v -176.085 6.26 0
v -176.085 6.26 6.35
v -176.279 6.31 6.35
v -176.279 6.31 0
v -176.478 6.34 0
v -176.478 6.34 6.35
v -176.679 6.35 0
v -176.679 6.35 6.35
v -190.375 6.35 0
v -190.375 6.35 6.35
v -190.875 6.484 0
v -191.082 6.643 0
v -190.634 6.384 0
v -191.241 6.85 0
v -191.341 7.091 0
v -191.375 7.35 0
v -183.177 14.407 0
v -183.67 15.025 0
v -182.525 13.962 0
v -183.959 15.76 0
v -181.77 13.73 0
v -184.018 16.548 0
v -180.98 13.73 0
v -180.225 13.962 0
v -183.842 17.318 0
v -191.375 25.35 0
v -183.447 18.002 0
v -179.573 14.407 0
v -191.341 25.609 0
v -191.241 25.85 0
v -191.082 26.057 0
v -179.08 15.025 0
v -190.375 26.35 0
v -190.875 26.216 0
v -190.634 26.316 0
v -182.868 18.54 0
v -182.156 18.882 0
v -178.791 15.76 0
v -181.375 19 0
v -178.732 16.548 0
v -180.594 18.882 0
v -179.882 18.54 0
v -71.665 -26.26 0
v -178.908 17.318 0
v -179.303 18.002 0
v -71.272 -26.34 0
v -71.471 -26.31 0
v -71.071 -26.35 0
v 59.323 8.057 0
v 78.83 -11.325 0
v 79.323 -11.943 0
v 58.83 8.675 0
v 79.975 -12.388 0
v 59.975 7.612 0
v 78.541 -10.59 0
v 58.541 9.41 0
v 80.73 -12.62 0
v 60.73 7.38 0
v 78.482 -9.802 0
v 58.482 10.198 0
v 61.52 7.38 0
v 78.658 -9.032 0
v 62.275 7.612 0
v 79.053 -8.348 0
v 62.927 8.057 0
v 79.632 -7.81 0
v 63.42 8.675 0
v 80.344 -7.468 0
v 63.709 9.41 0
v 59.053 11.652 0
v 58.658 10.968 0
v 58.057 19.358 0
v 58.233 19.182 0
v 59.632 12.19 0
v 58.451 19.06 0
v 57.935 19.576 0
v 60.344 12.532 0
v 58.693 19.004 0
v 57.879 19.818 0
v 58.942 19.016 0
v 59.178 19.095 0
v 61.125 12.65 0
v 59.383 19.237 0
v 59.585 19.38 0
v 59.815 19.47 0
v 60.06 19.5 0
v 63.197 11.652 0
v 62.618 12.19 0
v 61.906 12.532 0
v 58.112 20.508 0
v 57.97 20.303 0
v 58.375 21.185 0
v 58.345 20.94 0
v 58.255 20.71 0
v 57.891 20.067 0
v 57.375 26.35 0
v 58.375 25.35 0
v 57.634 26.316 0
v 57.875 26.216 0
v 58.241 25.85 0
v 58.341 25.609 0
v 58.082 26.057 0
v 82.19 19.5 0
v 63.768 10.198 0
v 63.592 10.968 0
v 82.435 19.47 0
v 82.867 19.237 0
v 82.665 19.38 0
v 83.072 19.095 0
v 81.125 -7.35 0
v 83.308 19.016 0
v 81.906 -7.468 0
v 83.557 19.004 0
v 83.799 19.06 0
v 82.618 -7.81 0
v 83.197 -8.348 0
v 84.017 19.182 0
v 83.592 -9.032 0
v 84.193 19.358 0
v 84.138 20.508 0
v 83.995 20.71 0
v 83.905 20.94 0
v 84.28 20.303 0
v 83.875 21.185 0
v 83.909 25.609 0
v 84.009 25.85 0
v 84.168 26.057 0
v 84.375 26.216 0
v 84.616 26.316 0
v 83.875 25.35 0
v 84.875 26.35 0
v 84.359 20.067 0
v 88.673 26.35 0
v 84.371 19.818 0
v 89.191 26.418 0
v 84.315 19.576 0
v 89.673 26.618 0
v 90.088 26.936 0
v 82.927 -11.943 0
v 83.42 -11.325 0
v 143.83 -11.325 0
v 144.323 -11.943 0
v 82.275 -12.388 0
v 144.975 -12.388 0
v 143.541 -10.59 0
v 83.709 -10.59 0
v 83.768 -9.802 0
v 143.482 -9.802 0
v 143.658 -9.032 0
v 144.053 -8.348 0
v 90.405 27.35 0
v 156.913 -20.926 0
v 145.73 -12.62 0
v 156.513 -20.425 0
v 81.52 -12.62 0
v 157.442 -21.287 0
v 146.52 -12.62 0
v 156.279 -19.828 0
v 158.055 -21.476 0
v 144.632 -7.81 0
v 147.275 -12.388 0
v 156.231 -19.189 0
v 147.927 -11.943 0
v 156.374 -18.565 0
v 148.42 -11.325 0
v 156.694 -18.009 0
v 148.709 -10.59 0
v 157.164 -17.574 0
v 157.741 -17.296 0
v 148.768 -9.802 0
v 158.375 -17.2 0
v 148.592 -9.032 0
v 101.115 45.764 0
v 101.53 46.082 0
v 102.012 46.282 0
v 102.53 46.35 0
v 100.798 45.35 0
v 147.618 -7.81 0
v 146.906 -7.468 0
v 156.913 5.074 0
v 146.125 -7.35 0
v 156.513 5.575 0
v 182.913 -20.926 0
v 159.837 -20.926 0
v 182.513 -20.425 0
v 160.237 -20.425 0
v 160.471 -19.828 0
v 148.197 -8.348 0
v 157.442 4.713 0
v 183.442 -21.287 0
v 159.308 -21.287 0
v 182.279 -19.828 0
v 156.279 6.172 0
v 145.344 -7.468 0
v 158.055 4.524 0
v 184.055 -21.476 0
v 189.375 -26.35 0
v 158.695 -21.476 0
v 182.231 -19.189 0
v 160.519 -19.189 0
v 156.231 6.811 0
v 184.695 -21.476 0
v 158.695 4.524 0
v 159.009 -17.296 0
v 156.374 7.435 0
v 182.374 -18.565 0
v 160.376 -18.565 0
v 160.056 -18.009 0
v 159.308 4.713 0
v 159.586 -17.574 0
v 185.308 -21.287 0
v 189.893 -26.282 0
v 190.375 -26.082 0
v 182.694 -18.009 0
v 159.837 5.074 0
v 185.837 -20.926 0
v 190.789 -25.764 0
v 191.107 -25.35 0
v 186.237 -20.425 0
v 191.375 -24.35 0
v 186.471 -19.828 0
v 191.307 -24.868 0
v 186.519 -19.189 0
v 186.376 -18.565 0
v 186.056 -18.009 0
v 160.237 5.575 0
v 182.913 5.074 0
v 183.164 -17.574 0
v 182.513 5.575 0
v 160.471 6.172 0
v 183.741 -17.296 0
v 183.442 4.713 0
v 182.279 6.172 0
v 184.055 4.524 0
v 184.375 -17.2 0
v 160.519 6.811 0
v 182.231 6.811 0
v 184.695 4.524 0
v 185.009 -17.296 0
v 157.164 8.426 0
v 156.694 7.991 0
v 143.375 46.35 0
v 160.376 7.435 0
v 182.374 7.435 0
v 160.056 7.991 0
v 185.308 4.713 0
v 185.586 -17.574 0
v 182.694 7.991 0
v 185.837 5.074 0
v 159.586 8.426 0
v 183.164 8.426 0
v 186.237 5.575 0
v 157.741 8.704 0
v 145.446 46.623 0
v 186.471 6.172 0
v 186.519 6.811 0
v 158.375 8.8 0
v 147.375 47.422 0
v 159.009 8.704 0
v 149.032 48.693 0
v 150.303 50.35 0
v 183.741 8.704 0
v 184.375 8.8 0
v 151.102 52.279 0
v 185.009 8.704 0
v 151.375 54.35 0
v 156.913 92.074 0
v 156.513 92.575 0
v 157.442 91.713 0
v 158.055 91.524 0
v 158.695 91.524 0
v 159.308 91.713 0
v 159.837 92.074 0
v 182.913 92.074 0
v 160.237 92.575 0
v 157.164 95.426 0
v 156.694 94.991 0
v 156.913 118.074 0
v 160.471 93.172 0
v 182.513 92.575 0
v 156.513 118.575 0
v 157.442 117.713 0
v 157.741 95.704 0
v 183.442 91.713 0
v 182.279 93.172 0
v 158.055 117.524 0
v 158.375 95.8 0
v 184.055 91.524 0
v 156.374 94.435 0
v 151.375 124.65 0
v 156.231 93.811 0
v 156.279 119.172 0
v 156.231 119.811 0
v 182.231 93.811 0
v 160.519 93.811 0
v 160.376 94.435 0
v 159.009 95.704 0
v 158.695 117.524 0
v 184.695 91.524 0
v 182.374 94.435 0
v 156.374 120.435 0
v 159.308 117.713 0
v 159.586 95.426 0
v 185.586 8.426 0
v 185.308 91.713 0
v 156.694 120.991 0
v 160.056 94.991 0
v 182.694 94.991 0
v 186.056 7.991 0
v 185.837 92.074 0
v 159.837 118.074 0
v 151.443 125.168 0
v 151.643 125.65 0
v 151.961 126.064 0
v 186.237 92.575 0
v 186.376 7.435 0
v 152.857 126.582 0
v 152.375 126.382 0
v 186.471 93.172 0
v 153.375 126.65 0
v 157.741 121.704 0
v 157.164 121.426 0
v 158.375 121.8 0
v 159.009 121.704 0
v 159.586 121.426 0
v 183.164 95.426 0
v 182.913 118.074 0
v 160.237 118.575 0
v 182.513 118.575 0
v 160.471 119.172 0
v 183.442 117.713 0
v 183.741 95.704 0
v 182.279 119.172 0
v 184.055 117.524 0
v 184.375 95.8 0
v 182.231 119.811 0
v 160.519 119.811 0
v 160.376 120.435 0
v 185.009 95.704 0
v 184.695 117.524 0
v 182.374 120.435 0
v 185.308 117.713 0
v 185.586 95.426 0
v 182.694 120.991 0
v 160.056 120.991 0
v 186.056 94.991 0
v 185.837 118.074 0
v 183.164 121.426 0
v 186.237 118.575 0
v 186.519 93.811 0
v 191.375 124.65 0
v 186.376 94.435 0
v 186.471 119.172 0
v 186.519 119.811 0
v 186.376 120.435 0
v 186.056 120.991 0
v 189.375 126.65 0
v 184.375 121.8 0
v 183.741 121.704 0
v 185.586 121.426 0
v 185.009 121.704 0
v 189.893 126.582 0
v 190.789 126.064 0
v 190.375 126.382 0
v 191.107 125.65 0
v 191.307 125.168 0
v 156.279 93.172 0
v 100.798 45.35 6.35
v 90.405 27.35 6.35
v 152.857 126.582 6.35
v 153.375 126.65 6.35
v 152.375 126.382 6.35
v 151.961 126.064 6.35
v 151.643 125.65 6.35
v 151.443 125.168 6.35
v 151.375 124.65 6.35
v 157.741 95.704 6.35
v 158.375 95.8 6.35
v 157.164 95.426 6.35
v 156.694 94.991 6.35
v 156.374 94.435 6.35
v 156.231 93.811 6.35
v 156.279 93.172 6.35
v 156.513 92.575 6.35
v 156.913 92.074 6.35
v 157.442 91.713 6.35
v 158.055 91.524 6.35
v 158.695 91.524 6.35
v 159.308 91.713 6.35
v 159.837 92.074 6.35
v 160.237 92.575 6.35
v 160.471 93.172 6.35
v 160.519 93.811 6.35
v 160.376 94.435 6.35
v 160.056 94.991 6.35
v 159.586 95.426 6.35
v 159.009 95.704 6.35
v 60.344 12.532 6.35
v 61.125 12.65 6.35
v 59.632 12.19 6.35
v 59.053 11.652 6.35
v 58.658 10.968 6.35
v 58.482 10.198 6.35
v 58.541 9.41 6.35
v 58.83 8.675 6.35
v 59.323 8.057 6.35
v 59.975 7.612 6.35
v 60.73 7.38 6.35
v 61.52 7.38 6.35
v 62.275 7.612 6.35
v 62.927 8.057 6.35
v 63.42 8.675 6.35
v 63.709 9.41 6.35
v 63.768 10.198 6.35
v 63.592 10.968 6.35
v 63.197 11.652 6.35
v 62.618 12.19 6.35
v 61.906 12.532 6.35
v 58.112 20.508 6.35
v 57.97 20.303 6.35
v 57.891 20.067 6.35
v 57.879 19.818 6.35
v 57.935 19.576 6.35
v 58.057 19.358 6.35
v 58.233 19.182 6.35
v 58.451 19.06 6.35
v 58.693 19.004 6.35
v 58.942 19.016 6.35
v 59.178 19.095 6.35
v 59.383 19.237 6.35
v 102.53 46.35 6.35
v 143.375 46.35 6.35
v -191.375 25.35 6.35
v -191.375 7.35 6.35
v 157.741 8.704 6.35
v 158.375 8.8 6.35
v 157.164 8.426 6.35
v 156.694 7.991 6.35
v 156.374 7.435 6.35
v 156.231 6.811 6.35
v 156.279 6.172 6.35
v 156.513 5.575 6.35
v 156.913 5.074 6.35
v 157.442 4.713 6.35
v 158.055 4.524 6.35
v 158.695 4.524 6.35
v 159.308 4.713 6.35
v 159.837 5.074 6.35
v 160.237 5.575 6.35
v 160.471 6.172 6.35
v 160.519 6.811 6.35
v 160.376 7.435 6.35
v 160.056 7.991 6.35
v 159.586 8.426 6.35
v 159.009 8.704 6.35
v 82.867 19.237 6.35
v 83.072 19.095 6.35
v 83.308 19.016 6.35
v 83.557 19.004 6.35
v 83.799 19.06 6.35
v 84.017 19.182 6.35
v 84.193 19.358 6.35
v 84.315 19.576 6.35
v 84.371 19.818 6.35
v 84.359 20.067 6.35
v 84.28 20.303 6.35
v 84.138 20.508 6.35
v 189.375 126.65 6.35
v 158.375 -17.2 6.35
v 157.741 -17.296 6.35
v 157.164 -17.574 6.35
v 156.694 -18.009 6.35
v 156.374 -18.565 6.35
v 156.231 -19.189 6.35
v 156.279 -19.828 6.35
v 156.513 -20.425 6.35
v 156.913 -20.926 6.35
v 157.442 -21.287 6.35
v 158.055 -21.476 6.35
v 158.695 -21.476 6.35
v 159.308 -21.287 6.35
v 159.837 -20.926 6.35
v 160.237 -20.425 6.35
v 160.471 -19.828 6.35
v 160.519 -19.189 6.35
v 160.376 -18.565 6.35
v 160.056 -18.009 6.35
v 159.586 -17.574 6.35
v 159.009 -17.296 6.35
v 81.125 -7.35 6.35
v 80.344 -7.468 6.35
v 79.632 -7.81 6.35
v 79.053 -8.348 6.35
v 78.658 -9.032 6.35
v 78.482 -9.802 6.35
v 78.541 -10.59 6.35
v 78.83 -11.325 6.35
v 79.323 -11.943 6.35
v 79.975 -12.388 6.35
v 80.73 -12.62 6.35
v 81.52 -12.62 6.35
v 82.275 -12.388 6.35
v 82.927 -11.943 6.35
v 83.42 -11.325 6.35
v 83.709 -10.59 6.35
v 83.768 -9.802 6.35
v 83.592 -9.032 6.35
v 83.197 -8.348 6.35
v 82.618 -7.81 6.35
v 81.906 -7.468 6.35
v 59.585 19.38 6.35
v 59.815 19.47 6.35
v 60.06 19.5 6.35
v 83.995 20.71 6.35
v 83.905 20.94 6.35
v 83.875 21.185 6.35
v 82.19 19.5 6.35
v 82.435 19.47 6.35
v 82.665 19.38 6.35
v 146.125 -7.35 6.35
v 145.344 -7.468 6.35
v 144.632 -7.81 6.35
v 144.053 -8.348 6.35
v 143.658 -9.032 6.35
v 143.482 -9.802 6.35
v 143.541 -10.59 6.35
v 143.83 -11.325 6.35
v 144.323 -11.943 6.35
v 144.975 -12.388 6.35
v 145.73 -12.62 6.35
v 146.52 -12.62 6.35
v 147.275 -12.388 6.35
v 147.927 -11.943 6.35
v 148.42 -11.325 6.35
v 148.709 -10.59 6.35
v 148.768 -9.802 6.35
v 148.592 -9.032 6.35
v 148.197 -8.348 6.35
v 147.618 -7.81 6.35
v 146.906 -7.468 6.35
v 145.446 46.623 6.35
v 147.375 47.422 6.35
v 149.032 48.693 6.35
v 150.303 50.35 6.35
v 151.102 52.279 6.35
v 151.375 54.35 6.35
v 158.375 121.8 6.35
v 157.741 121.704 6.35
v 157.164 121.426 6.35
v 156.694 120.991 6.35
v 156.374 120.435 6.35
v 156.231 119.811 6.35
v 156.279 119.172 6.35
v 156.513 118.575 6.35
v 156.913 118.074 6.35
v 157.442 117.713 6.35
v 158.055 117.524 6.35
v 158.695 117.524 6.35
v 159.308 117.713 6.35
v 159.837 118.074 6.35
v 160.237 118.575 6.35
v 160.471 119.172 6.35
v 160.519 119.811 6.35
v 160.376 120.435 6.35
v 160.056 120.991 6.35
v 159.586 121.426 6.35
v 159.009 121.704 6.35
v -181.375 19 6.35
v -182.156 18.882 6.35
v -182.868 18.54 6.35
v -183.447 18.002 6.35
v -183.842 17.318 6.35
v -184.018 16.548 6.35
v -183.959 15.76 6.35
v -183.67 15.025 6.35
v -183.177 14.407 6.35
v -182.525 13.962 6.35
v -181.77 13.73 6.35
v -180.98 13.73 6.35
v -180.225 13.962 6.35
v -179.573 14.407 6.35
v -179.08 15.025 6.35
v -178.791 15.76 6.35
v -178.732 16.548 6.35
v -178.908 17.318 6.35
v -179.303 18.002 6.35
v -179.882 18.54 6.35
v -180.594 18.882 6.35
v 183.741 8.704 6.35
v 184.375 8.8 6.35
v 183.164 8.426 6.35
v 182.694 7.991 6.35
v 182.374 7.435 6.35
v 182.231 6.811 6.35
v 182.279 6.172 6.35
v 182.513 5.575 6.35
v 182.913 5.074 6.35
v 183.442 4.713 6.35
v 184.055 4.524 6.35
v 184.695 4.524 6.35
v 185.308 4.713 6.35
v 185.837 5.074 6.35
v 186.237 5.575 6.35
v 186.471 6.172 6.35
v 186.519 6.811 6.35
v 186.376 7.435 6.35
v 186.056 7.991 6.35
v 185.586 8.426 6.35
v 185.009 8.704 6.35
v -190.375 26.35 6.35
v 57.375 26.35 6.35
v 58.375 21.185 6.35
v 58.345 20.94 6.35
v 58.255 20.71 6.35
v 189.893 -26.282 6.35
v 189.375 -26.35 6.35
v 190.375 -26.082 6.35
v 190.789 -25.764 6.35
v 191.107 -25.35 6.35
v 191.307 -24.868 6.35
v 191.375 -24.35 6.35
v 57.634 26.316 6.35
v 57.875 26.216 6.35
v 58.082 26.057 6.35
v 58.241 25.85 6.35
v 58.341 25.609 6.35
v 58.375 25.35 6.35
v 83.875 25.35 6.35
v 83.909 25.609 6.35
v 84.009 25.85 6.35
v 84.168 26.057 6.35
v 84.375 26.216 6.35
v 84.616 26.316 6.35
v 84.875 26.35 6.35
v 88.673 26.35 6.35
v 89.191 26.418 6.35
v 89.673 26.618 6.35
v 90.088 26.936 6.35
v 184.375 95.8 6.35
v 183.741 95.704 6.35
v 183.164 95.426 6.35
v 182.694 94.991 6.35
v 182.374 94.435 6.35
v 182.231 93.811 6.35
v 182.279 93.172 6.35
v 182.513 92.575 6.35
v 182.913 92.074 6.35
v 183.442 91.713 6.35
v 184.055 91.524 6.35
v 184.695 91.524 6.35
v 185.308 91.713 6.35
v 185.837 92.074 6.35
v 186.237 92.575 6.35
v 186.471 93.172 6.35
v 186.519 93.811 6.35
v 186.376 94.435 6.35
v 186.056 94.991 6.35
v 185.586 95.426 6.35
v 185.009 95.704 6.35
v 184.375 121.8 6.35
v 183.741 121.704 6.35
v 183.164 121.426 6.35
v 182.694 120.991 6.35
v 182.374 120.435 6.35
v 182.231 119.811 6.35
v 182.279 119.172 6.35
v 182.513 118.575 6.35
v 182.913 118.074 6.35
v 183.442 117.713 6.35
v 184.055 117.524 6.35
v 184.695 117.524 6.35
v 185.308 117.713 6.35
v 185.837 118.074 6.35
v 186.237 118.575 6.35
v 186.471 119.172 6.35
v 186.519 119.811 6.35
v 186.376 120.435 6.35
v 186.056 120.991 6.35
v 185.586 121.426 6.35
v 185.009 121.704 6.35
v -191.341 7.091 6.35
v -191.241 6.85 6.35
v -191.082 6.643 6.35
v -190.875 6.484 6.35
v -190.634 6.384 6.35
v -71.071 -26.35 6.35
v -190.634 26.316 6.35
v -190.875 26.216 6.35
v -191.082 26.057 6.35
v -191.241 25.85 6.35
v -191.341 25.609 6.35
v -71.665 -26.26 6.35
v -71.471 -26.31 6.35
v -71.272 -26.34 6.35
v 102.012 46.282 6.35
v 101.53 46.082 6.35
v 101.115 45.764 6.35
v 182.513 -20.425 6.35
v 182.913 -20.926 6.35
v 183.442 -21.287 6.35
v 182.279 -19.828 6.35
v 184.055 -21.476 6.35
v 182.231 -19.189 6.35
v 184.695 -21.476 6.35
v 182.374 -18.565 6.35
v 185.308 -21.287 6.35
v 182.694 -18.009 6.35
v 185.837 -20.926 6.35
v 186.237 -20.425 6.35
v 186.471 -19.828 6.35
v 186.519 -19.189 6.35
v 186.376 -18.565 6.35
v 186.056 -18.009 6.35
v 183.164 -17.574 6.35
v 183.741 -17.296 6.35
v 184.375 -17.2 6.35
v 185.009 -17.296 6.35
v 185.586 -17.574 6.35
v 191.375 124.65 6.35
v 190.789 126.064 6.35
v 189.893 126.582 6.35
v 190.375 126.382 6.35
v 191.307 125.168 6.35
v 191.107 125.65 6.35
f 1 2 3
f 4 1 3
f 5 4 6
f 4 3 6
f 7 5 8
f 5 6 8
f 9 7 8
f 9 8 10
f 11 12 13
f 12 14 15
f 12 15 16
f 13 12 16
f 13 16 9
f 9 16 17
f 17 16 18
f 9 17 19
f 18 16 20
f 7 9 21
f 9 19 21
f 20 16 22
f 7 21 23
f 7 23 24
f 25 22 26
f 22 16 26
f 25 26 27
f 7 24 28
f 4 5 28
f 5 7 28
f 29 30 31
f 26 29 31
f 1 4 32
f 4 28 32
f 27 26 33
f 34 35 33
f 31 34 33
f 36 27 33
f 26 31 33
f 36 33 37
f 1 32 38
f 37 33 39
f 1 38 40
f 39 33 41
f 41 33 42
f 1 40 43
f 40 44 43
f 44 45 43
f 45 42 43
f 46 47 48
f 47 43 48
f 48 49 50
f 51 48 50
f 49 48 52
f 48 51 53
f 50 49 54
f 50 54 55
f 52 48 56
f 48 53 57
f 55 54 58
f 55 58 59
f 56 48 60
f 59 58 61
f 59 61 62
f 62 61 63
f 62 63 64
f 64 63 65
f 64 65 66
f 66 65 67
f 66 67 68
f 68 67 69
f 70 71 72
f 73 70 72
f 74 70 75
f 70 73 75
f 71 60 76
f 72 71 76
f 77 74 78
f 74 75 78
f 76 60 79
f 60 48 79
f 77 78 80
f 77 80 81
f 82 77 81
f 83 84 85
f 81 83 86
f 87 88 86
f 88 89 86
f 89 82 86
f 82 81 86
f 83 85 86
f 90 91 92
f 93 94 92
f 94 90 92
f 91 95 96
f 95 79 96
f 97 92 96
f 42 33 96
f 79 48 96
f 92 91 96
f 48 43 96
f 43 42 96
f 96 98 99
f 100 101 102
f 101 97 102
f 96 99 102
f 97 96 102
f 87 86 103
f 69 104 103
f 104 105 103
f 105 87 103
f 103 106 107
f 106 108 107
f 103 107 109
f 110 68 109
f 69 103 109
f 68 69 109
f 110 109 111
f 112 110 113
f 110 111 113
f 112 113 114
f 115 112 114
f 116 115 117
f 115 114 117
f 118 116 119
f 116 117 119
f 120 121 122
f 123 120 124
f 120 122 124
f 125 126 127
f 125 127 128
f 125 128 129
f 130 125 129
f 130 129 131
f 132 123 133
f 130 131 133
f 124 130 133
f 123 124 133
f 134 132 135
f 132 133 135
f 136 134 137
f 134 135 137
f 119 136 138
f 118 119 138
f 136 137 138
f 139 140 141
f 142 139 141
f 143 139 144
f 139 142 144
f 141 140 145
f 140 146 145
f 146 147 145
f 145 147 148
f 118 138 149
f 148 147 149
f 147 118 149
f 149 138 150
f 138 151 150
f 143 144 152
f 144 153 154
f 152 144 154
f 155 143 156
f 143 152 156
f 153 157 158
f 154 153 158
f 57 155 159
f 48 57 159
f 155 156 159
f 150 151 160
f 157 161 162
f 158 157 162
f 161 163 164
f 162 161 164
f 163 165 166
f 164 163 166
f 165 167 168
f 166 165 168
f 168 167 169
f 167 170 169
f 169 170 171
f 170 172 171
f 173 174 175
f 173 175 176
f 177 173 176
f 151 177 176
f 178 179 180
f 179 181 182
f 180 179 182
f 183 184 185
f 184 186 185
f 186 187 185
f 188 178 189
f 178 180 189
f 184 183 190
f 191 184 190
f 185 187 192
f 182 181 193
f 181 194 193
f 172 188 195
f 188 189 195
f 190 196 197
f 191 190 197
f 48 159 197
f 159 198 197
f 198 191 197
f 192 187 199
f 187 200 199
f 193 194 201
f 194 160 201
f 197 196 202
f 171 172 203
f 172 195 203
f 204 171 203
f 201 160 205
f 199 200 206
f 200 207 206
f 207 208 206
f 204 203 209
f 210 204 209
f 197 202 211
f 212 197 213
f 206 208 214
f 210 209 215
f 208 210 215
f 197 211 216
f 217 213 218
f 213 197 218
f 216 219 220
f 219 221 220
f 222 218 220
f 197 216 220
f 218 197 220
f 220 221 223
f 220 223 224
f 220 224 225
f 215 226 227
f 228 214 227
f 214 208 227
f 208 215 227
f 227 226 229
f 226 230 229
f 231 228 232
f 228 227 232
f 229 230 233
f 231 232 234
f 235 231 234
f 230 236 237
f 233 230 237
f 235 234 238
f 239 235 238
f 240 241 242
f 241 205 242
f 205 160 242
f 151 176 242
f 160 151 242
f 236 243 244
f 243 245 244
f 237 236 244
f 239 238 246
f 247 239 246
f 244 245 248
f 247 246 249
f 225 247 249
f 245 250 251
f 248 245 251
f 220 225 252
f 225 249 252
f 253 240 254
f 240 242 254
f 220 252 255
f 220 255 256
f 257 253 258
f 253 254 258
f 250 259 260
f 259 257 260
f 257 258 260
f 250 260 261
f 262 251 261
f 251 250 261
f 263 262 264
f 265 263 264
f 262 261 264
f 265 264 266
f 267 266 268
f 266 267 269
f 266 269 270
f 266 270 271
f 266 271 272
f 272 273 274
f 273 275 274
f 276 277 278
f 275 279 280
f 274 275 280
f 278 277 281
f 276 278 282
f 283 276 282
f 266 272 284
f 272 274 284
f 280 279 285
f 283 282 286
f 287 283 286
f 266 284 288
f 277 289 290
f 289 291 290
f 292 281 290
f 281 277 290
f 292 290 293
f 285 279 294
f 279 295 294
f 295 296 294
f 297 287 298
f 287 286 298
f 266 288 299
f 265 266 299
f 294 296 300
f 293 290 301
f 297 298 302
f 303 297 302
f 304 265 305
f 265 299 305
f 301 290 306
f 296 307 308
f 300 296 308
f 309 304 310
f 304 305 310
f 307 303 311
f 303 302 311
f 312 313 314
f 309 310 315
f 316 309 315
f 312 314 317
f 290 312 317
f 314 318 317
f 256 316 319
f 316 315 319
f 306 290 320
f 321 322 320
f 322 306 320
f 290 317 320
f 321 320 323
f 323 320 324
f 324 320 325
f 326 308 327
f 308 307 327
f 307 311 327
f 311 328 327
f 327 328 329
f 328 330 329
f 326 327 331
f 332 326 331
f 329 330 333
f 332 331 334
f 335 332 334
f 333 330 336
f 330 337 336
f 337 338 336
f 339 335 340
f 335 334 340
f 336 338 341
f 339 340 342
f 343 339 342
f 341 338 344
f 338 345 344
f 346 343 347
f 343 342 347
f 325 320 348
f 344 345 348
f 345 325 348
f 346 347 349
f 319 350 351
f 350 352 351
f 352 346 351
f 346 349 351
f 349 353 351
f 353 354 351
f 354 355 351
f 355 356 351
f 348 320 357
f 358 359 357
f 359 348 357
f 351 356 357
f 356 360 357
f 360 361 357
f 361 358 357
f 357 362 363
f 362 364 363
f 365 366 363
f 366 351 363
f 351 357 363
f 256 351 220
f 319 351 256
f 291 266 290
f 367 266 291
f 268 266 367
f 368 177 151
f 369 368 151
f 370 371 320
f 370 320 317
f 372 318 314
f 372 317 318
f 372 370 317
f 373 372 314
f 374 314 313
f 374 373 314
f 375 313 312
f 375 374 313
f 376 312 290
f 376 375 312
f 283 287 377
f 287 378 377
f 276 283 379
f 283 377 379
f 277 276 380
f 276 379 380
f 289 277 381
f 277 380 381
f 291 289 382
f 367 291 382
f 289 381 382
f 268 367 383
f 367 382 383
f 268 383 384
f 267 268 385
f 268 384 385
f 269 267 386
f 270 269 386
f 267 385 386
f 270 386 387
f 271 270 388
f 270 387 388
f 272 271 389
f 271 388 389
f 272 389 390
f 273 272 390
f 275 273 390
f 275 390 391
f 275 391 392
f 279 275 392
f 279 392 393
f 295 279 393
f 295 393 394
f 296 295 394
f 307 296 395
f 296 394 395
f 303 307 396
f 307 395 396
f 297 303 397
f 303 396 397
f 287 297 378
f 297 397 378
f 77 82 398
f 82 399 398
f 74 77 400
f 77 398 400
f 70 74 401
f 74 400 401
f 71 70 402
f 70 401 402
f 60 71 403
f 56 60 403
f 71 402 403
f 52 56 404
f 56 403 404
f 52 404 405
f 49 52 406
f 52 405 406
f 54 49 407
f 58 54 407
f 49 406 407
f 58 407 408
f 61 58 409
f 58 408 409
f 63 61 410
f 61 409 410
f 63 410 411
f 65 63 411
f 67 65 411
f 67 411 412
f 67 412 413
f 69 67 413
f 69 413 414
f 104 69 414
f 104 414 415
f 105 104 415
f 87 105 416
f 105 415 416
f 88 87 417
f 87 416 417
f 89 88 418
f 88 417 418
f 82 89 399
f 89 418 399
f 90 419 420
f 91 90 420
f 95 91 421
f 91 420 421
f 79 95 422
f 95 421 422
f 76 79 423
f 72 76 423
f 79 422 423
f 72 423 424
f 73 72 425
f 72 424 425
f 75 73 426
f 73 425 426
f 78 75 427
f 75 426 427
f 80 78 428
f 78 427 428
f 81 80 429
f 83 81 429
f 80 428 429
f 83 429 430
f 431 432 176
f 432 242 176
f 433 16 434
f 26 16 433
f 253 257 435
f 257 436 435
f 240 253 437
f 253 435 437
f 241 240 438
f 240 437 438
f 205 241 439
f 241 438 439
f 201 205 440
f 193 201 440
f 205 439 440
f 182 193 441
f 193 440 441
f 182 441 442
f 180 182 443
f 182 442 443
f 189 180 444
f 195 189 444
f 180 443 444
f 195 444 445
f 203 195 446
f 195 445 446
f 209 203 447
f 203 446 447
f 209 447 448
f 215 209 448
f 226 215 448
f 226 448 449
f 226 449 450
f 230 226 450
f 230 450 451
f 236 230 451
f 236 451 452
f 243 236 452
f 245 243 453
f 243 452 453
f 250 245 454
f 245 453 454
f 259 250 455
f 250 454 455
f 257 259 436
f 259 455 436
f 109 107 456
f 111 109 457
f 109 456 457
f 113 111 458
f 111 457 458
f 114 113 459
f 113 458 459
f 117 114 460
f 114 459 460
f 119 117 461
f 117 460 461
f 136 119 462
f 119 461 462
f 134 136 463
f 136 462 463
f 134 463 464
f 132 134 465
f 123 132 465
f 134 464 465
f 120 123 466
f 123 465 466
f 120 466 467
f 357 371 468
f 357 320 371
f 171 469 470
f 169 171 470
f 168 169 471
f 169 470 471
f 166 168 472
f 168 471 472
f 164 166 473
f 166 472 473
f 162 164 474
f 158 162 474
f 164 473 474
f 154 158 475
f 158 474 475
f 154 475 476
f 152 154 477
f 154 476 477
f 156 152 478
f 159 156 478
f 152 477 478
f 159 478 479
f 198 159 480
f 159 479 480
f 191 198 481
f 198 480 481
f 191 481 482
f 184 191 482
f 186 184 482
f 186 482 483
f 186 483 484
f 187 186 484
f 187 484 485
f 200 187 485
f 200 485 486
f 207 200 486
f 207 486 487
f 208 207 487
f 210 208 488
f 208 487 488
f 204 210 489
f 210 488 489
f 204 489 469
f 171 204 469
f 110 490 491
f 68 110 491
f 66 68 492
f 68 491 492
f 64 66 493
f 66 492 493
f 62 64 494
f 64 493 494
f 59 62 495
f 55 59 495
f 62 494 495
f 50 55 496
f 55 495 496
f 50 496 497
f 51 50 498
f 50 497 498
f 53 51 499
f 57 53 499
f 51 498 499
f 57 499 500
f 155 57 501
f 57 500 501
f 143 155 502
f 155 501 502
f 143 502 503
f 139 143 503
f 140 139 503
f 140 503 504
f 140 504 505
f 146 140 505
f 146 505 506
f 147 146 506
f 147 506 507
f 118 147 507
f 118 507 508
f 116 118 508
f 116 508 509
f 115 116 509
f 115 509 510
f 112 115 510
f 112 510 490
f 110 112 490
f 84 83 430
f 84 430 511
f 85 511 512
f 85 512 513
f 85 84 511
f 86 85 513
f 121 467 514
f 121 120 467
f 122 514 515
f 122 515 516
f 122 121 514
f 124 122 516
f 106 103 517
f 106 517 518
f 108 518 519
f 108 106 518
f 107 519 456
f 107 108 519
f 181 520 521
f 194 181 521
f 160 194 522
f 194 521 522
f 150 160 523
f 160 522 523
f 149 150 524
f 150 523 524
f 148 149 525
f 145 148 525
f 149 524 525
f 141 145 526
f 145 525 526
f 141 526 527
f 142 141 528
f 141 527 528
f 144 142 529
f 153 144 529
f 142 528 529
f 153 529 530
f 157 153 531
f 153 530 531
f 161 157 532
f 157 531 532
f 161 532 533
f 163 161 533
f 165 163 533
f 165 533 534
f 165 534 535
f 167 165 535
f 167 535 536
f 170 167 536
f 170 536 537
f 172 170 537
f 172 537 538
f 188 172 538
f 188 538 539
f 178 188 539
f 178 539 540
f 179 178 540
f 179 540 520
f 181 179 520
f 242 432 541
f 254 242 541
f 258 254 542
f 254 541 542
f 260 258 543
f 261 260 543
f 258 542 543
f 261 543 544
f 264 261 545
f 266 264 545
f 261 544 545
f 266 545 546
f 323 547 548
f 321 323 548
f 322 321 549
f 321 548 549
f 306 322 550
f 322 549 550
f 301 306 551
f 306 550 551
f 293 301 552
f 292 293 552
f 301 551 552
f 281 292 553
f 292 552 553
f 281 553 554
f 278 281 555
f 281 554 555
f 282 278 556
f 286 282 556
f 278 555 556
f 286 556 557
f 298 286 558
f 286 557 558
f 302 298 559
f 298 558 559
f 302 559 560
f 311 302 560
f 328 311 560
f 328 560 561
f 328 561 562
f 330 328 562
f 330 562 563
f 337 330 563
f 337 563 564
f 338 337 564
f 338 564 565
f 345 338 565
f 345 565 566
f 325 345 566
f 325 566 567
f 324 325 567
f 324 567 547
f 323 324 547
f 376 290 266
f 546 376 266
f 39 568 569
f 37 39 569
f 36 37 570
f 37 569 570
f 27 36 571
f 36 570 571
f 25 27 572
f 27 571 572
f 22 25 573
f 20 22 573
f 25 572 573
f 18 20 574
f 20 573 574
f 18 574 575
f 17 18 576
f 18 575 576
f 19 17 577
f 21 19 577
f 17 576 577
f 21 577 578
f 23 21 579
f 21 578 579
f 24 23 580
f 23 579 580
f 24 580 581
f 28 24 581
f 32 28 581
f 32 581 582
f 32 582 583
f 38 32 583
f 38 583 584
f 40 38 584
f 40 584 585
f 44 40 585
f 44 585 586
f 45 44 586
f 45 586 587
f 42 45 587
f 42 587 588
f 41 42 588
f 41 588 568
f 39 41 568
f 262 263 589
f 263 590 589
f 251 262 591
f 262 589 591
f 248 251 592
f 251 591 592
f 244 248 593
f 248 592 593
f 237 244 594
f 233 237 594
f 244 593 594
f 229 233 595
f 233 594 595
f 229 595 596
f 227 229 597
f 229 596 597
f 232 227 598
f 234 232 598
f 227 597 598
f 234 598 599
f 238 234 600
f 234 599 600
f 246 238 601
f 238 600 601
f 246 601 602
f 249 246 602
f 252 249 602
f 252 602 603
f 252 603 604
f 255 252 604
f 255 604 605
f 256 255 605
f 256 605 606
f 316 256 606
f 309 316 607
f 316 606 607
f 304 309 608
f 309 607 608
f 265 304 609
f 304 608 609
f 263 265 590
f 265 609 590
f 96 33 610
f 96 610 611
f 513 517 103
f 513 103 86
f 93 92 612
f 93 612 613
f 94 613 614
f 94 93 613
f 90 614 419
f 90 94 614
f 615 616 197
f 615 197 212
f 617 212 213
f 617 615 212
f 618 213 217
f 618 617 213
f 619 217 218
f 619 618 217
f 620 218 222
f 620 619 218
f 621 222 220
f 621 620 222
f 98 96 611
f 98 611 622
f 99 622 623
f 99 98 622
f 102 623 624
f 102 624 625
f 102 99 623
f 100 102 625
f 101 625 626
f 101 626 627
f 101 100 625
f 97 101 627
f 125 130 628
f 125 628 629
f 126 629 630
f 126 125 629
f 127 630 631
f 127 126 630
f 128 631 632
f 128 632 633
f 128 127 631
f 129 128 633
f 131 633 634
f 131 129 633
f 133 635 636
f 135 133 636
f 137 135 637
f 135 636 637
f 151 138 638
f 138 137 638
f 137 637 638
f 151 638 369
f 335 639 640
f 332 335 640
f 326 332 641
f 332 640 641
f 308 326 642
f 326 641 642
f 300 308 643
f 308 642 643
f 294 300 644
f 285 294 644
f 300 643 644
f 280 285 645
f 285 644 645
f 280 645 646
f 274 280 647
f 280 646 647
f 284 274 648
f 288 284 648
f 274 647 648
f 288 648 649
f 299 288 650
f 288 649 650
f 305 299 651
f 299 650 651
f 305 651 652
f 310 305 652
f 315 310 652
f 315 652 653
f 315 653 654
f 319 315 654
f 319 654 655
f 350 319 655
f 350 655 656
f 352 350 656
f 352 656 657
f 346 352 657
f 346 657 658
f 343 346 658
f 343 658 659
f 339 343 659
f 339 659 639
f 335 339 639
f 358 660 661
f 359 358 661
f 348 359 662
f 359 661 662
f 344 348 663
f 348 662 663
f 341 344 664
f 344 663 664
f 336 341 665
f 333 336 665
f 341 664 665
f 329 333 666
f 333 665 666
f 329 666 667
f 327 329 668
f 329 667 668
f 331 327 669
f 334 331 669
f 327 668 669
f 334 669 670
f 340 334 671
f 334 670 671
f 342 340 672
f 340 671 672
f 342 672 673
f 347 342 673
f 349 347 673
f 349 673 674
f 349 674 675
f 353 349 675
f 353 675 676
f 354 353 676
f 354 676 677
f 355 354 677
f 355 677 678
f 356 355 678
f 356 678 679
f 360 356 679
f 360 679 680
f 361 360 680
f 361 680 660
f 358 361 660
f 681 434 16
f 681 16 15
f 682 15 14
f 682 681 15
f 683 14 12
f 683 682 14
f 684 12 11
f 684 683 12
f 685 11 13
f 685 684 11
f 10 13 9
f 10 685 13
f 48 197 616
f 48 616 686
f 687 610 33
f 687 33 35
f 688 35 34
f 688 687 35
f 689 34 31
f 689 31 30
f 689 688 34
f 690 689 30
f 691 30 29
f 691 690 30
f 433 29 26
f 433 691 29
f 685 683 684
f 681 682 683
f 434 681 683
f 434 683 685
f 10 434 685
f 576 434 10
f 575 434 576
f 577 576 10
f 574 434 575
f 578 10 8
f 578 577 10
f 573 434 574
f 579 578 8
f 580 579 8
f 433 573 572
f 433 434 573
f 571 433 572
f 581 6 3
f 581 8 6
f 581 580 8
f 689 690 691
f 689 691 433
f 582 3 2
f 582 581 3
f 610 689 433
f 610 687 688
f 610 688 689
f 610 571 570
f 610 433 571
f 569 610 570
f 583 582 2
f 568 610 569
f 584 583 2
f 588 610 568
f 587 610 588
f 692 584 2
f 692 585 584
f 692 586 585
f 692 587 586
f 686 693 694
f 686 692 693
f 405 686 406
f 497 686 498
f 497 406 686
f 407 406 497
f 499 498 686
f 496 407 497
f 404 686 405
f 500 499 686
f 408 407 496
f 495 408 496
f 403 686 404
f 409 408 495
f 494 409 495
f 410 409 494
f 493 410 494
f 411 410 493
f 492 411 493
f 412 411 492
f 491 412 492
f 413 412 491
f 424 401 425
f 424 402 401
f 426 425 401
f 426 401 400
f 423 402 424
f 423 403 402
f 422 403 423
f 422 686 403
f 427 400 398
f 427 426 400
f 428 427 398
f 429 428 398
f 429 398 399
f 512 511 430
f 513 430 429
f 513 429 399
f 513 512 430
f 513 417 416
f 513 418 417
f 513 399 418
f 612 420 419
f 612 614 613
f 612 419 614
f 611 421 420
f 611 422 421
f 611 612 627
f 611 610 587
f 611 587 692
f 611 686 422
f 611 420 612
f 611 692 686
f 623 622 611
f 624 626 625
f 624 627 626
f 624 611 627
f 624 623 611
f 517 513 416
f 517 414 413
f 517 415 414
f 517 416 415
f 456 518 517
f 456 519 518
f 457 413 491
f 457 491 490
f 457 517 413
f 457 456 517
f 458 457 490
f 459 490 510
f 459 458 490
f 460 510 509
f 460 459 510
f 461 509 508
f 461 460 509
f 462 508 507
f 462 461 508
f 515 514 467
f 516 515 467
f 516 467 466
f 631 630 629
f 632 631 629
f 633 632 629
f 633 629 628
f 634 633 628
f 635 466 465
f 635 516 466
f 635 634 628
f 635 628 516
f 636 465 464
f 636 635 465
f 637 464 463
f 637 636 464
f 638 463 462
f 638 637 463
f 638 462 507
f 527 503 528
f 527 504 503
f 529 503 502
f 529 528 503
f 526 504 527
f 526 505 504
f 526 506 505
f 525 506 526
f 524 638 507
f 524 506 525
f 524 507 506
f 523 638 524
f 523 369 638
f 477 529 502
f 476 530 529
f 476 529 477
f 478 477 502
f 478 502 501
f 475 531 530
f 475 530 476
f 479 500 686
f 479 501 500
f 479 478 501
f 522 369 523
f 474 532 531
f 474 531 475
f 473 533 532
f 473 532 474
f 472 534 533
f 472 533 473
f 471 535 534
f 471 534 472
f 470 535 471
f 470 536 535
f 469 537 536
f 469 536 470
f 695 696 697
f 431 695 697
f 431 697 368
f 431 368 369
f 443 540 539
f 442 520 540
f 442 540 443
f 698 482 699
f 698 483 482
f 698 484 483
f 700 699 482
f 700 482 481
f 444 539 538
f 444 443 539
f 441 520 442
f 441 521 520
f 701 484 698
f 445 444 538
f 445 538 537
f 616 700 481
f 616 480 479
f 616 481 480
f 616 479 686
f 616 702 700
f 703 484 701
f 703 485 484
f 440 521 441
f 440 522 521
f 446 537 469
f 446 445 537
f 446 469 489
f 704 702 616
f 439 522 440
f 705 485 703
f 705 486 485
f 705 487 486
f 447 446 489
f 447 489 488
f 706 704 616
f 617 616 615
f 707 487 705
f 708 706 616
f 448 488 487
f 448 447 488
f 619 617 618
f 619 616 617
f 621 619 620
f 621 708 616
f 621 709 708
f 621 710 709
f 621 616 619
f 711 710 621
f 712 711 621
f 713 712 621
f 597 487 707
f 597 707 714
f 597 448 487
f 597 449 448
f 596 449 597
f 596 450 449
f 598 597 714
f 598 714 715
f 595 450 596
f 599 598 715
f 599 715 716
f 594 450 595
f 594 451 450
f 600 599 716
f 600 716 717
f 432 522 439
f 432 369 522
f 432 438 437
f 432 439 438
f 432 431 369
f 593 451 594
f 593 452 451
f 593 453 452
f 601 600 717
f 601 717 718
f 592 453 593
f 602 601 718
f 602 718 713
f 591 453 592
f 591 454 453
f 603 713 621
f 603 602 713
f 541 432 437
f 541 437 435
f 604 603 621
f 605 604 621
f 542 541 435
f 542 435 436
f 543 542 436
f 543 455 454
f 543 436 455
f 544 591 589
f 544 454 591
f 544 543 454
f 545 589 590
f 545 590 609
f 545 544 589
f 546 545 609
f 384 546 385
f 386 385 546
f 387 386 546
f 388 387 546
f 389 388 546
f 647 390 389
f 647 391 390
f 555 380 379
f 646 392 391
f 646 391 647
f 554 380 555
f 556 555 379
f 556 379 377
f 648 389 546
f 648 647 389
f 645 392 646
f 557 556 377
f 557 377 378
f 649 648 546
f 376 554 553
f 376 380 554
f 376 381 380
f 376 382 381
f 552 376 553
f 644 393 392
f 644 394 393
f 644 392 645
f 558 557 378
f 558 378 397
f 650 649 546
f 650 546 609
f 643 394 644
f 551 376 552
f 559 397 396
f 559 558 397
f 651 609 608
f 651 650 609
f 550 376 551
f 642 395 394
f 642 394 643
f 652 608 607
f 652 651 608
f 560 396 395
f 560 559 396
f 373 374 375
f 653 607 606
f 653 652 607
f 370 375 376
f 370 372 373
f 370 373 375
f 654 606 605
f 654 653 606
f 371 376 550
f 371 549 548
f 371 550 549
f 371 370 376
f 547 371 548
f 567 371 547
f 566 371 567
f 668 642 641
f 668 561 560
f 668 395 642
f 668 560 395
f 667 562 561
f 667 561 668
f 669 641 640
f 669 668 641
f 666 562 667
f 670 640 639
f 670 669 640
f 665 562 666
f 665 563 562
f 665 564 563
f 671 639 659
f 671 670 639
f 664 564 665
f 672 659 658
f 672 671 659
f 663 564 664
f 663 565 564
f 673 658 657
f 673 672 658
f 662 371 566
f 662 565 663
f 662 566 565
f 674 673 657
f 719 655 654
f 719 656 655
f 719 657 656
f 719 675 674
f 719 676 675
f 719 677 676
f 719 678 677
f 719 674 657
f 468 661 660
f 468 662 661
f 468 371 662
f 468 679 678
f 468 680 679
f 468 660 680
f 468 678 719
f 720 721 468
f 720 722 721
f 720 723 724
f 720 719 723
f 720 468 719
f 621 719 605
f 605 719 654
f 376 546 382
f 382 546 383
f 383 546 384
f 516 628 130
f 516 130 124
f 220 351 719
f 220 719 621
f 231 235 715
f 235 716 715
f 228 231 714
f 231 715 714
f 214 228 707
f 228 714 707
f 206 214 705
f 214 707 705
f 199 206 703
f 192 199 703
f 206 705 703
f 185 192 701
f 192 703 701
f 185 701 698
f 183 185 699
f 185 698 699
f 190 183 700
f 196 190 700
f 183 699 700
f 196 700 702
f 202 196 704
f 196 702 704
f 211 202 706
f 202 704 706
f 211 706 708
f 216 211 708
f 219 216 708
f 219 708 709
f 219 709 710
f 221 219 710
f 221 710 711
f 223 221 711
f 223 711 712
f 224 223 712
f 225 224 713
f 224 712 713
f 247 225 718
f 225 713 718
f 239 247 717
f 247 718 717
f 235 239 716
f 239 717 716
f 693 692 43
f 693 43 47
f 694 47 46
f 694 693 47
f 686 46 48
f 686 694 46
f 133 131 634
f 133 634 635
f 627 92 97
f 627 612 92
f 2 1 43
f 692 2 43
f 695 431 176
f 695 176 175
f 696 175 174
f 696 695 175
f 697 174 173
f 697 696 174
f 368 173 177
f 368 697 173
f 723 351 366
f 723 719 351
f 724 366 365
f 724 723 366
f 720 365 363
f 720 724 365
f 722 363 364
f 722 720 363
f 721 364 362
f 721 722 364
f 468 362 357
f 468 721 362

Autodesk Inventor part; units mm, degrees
ref_plane "YZ Plane" through (0, 0, 0) normal (1, 0, 0) x (0, 1, 0)
ref_plane "XZ Plane" through (0, 0, 0) normal (0, 1, 0) x (-1, 0, 0)
ref_plane "XY Plane" through (0, 0, 0) normal (0, 0, 1) x (1, 0, 0)
sketch "Sketch1" plane through (0, 0, 0) normal (0, 0, 1) x (1, 0, 0)
  line L0 (191.375, -26.35) -> (-191.375, -26.35)
  line L1 (-191.375, -26.35) -> (-191.375, 26.35)
  line L2 (-191.375, 26.35) -> (191.375, 26.35)
  line L3 (191.375, 26.35) -> (191.375, -26.35)
  line L4 (191.375, -26.35) -> (-191.375, 26.35) construction
  line L5 (-191.375, -26.35) -> (191.375, 26.35) construction
  line L6 (-191.375, 26.35) -> (-171.375, 26.35)
  line L7 (-171.375, 26.35) -> (-171.375, 6.35)
  line L8 (-171.375, 6.35) -> (-191.375, 6.35)
  line L9 (-191.375, 6.35) -> (-191.375, 26.35)
  line L10 (-176.375, 6.35) -> (-71.375, -26.35)
  line L11 (-181.375, 6.35) -> (-181.375, 46.2875) construction
  line L12 (71.125, 20) -> (91.125, 20)
  line L13 (91.125, 20) -> (91.125, -20)
  line L14 (91.125, -20) -> (71.125, -20)
  line L15 (71.125, -20) -> (71.125, 20)
  line L16 (-190.125, 46.2875) -> (79.875, 46.2875) construction
  line L17 (79.875, 46.2875) -> (79.875, 38.35) construction
  line L18 (79.875, 38.35) -> (-190.125, 38.35) construction
  line L19 (-190.125, 38.35) -> (-190.125, 46.2875) construction
  line L20 (71.125, 46.2875) -> (-181.375, 46.2875) construction
  line L21 (191.375, -26.35) -> (151.375, -26.35)
  line L22 (151.375, -26.35) -> (151.375, 13.65)
  line L23 (151.375, 13.65) -> (191.375, 13.65)
  line L24 (191.375, 13.65) -> (191.375, -26.35)
  line L25 (191.375, -26.35) -> (151.375, 13.65) construction
  line L26 (151.375, -26.35) -> (191.375, 13.65) construction
  line L27 (184.375, -19.35) -> (158.375, -19.35) construction
  line L28 (158.375, -19.35) -> (158.375, 6.65) construction
  line L29 (158.375, 6.65) -> (184.375, 6.65) construction
  line L30 (184.375, 6.65) -> (184.375, -19.35) construction
  line L31 (184.375, -19.35) -> (158.375, 6.65) construction
  line L32 (158.375, -19.35) -> (184.375, 6.65) construction
  line L33 (191.375, 86.65) -> (151.375, 86.65)
  line L34 (151.375, 86.65) -> (151.375, 126.65)
  line L35 (151.375, 126.65) -> (191.375, 126.65)
  line L36 (191.375, 126.65) -> (191.375, 86.65)
  line L37 (191.375, 86.65) -> (151.375, 126.65) construction
  line L38 (151.375, 86.65) -> (191.375, 126.65) construction
  line L39 (184.375, 93.65) -> (158.375, 93.65) construction
  line L40 (158.375, 93.65) -> (158.375, 119.65) construction
  line L41 (158.375, 119.65) -> (184.375, 119.65) construction
  line L42 (184.375, 119.65) -> (184.375, 93.65) construction
  line L43 (184.375, 93.65) -> (158.375, 119.65) construction
  line L44 (158.375, 93.65) -> (184.375, 119.65) construction
  line L45 (191.375, 86.65) -> (191.375, 26.35)
  line L46 (151.375, 86.65) -> (151.375, 13.65)
  line L47 (171.375, -6.35) -> (211.375, -6.35) construction
  line L48 (-181.375, 26.3188) -> (-181.375, 6.35) construction
  line L49 (156.125, -20) -> (136.125, -20)
  line L50 (136.125, -20) -> (136.125, 0)
  line L51 (136.125, 0) -> (156.125, 0)
  line L52 (156.125, 0) -> (156.125, -20)
  line L53 (156.125, -20) -> (136.125, 0) construction
  line L54 (136.125, -20) -> (156.125, 0) construction
  line L55 (91.125, 20) -> (51.125, 20)
  line L56 (51.125, 20) -> (51.125, 0)
  line L57 (51.125, 0) -> (91.125, 0)
  line L58 (91.125, 0) -> (91.125, 20)
  line L59 (151.375, 46.35) -> (101.375, 46.35)
  line L60 (101.375, 46.35) -> (89.828, 26.35)
  point P0 (0, 0)
  point P1 (71.125, 0)
  point P2 (-55.125, 46.2875)
  point P3 (171.375, 106.65)
  point P4 (116.734, 26.35)
  point P5 (61.125, 10)
  point P6 (81.125, -10)
  point P7 (91.125, 0)
  point P8 (88.5805, 0)
  point P9 (81.125, 20)
  point P10 (146.125, -10)
  point P11 (146.125, -10)
  point P12 (51.125, 10)
  point P13 (81.125, -20)
  point P14 (-181.375, 16.35)
  point P15 (-191.375, 16.35)
  point P16 (-171.375, 26.35)
  point P17 (151.375, 26.35)
  dimension "d0" = 52.7
  dimension "d1" = 20
  dimension "d2" = 20
  dimension "d4" = 120
  dimension "d5" = 20
  dimension "d6" = 40
  dimension "d8" = 270
  dimension "d9" = 7.9375
  dimension "d10" = 12
  dimension "d11" = 40
  dimension "d12" = 40
  dimension "d13" = 26
  dimension "d14" = 26
  dimension "d15" = 40
  dimension "d16" = 40
  dimension "d17" = 26
  dimension "d18" = 26
  dimension "d19" = 153
  dimension "d20" = 40
  dimension "d21" = 226.5
  dimension "d22" = 15
  dimension "d35" = 20
  dimension "d47" = 20
  dimension "d48" = 20
  dimension "d49" = 45
  dimension "d57" = 252.5
  dimension "d58" = 10
  dimension "d59" = 10
  dimension "d69" = 120
  dimension "d70" = 50
extrude "Extrusion1" add sketch "Sketch1" along normal blind 6.35 contours L0 L22 L49 L52 L51 L23 L3 | L0 L10 L8 L7 L2 L46 L22 L51 L50 L49 | L23 L46 L2 L3 | L49 L50 L51 L22 | L22 L51 L52 L49 | L2 L46 L33 L45 | L8 L1 L2 L7 | L2 L60 L59 L46 | L33 L34 L35 L36 | L12 L13 L57 L15 | L15 L57 L56 L55 | L57 L13 L14 L15
fillet "Fillet2" radius 1 2 edges at (-191.375, 26.35, 3.175) (-191.375, 6.35, 3.175)
fillet "Fillet5" radius 8 1 edges at (151.375, 46.35, 3.175)
fillet "Fillet3" radius 2 7 edges at (151.375, 126.65, 3.175) (191.375, 126.65, 3.175) (191.375, -26.35, 3.175) (89.828, 26.35, 3.175) (101.375, 46.35, 3.175) (-71.375, -26.35, 3.175) (-176.375, 6.35, 3.175)
hole "Hole1" at (61.125, 10, 0) at (81.125, -10, 0) at (146.125, -10, 0) at (-181.375, 16.35, 0) direction (0, 0, 1) diameter 5.3 end through all
hole "Hole2" at (184.375, 6.65, 0) at (158.375, 6.65, 0) at (158.375, -19.35, 0) at (184.375, -19.35, 0) at (184.375, 119.65, 0) at (158.375, 119.65, 0) at (158.375, 93.65, 0) at (184.375, 93.65, 0) direction (0, 0, 1) diameter 4.3 end through all
sketch "Sketch2" plane through (0, 0, 6.35) normal (0, 0, 1) x (1, 0, 0)
  line L0 (83.875, 19.5) -> (58.375, 19.5)
  line L1 (58.375, 19.5) -> (58.375, 26.35)
  line L2 (58.375, 26.35) -> (83.875, 26.35)
  line L3 (83.875, 26.35) -> (83.875, 19.5)
  line L4 (83.875, 19.5) -> (58.375, 26.35) construction
  line L5 (58.375, 19.5) -> (83.875, 26.35) construction
  circle A0 centre (61.125, 10) radius 2.65 projected
  circle A1 centre (81.125, -10) radius 2.65 projected
  line L6 (61.125, 10) -> (81.125, -10) construction
  line L7 (88.6733, 26.35) -> (-190.375, 26.35) construction
  circle A2 centre (58.775, 19.9) radius 0.9
  circle A3 centre (83.475, 19.9) radius 0.9
  line L8 (83.475, 25.95) -> (58.775, 25.95) construction
  line L9 (58.775, 25.95) -> (58.775, 19.9) construction
  line L10 (58.775, 19.9) -> (83.475, 19.9) construction
  line L11 (83.475, 19.9) -> (83.475, 25.95) construction
  line L12 (83.475, 25.95) -> (58.775, 19.9) construction
  line L13 (58.775, 25.95) -> (83.475, 19.9) construction
  point P0 (0, 0)
  point P1 (71.125, 22.925)
  point P2 (71.125, 0)
  point P3 (119.4481, 26.35)
  point P4 (58.375, 20.7062)
  point P5 (59.5812, 19.5)
  point P6 (82.6688, 19.5)
  point P7 (83.875, 20.7062)
  point P8 (194.625, 26.35)
  point P9 (154.625, 26.35)
  point P10 (93.078, 26.35)
  dimension "d60" = 25.5
  dimension "d61" = 6.85
  dimension "d62" = 1.8
  dimension "d63" = 0.4
  dimension "d64" = 0.4
extrude "Extrusion2" cut sketch "Sketch2" against normal through all contours L3 A3 L0 | L0 A3 L3 | L0 A2 L1 L2 L3 A3 | A2 L1 L0 | L0 L1 A2
fillet "Fillet4" radius 1 6 edges at (83.875, 20.7062, 3.175) (82.6688, 19.5, 3.175) (59.5812, 19.5, 3.175) (58.375, 20.7062, 3.175) (58.375, 26.35, 3.175) (83.875, 26.35, 3.175)
properties part number "Z-Axis Support Plates" material "Aluminum 6061"
